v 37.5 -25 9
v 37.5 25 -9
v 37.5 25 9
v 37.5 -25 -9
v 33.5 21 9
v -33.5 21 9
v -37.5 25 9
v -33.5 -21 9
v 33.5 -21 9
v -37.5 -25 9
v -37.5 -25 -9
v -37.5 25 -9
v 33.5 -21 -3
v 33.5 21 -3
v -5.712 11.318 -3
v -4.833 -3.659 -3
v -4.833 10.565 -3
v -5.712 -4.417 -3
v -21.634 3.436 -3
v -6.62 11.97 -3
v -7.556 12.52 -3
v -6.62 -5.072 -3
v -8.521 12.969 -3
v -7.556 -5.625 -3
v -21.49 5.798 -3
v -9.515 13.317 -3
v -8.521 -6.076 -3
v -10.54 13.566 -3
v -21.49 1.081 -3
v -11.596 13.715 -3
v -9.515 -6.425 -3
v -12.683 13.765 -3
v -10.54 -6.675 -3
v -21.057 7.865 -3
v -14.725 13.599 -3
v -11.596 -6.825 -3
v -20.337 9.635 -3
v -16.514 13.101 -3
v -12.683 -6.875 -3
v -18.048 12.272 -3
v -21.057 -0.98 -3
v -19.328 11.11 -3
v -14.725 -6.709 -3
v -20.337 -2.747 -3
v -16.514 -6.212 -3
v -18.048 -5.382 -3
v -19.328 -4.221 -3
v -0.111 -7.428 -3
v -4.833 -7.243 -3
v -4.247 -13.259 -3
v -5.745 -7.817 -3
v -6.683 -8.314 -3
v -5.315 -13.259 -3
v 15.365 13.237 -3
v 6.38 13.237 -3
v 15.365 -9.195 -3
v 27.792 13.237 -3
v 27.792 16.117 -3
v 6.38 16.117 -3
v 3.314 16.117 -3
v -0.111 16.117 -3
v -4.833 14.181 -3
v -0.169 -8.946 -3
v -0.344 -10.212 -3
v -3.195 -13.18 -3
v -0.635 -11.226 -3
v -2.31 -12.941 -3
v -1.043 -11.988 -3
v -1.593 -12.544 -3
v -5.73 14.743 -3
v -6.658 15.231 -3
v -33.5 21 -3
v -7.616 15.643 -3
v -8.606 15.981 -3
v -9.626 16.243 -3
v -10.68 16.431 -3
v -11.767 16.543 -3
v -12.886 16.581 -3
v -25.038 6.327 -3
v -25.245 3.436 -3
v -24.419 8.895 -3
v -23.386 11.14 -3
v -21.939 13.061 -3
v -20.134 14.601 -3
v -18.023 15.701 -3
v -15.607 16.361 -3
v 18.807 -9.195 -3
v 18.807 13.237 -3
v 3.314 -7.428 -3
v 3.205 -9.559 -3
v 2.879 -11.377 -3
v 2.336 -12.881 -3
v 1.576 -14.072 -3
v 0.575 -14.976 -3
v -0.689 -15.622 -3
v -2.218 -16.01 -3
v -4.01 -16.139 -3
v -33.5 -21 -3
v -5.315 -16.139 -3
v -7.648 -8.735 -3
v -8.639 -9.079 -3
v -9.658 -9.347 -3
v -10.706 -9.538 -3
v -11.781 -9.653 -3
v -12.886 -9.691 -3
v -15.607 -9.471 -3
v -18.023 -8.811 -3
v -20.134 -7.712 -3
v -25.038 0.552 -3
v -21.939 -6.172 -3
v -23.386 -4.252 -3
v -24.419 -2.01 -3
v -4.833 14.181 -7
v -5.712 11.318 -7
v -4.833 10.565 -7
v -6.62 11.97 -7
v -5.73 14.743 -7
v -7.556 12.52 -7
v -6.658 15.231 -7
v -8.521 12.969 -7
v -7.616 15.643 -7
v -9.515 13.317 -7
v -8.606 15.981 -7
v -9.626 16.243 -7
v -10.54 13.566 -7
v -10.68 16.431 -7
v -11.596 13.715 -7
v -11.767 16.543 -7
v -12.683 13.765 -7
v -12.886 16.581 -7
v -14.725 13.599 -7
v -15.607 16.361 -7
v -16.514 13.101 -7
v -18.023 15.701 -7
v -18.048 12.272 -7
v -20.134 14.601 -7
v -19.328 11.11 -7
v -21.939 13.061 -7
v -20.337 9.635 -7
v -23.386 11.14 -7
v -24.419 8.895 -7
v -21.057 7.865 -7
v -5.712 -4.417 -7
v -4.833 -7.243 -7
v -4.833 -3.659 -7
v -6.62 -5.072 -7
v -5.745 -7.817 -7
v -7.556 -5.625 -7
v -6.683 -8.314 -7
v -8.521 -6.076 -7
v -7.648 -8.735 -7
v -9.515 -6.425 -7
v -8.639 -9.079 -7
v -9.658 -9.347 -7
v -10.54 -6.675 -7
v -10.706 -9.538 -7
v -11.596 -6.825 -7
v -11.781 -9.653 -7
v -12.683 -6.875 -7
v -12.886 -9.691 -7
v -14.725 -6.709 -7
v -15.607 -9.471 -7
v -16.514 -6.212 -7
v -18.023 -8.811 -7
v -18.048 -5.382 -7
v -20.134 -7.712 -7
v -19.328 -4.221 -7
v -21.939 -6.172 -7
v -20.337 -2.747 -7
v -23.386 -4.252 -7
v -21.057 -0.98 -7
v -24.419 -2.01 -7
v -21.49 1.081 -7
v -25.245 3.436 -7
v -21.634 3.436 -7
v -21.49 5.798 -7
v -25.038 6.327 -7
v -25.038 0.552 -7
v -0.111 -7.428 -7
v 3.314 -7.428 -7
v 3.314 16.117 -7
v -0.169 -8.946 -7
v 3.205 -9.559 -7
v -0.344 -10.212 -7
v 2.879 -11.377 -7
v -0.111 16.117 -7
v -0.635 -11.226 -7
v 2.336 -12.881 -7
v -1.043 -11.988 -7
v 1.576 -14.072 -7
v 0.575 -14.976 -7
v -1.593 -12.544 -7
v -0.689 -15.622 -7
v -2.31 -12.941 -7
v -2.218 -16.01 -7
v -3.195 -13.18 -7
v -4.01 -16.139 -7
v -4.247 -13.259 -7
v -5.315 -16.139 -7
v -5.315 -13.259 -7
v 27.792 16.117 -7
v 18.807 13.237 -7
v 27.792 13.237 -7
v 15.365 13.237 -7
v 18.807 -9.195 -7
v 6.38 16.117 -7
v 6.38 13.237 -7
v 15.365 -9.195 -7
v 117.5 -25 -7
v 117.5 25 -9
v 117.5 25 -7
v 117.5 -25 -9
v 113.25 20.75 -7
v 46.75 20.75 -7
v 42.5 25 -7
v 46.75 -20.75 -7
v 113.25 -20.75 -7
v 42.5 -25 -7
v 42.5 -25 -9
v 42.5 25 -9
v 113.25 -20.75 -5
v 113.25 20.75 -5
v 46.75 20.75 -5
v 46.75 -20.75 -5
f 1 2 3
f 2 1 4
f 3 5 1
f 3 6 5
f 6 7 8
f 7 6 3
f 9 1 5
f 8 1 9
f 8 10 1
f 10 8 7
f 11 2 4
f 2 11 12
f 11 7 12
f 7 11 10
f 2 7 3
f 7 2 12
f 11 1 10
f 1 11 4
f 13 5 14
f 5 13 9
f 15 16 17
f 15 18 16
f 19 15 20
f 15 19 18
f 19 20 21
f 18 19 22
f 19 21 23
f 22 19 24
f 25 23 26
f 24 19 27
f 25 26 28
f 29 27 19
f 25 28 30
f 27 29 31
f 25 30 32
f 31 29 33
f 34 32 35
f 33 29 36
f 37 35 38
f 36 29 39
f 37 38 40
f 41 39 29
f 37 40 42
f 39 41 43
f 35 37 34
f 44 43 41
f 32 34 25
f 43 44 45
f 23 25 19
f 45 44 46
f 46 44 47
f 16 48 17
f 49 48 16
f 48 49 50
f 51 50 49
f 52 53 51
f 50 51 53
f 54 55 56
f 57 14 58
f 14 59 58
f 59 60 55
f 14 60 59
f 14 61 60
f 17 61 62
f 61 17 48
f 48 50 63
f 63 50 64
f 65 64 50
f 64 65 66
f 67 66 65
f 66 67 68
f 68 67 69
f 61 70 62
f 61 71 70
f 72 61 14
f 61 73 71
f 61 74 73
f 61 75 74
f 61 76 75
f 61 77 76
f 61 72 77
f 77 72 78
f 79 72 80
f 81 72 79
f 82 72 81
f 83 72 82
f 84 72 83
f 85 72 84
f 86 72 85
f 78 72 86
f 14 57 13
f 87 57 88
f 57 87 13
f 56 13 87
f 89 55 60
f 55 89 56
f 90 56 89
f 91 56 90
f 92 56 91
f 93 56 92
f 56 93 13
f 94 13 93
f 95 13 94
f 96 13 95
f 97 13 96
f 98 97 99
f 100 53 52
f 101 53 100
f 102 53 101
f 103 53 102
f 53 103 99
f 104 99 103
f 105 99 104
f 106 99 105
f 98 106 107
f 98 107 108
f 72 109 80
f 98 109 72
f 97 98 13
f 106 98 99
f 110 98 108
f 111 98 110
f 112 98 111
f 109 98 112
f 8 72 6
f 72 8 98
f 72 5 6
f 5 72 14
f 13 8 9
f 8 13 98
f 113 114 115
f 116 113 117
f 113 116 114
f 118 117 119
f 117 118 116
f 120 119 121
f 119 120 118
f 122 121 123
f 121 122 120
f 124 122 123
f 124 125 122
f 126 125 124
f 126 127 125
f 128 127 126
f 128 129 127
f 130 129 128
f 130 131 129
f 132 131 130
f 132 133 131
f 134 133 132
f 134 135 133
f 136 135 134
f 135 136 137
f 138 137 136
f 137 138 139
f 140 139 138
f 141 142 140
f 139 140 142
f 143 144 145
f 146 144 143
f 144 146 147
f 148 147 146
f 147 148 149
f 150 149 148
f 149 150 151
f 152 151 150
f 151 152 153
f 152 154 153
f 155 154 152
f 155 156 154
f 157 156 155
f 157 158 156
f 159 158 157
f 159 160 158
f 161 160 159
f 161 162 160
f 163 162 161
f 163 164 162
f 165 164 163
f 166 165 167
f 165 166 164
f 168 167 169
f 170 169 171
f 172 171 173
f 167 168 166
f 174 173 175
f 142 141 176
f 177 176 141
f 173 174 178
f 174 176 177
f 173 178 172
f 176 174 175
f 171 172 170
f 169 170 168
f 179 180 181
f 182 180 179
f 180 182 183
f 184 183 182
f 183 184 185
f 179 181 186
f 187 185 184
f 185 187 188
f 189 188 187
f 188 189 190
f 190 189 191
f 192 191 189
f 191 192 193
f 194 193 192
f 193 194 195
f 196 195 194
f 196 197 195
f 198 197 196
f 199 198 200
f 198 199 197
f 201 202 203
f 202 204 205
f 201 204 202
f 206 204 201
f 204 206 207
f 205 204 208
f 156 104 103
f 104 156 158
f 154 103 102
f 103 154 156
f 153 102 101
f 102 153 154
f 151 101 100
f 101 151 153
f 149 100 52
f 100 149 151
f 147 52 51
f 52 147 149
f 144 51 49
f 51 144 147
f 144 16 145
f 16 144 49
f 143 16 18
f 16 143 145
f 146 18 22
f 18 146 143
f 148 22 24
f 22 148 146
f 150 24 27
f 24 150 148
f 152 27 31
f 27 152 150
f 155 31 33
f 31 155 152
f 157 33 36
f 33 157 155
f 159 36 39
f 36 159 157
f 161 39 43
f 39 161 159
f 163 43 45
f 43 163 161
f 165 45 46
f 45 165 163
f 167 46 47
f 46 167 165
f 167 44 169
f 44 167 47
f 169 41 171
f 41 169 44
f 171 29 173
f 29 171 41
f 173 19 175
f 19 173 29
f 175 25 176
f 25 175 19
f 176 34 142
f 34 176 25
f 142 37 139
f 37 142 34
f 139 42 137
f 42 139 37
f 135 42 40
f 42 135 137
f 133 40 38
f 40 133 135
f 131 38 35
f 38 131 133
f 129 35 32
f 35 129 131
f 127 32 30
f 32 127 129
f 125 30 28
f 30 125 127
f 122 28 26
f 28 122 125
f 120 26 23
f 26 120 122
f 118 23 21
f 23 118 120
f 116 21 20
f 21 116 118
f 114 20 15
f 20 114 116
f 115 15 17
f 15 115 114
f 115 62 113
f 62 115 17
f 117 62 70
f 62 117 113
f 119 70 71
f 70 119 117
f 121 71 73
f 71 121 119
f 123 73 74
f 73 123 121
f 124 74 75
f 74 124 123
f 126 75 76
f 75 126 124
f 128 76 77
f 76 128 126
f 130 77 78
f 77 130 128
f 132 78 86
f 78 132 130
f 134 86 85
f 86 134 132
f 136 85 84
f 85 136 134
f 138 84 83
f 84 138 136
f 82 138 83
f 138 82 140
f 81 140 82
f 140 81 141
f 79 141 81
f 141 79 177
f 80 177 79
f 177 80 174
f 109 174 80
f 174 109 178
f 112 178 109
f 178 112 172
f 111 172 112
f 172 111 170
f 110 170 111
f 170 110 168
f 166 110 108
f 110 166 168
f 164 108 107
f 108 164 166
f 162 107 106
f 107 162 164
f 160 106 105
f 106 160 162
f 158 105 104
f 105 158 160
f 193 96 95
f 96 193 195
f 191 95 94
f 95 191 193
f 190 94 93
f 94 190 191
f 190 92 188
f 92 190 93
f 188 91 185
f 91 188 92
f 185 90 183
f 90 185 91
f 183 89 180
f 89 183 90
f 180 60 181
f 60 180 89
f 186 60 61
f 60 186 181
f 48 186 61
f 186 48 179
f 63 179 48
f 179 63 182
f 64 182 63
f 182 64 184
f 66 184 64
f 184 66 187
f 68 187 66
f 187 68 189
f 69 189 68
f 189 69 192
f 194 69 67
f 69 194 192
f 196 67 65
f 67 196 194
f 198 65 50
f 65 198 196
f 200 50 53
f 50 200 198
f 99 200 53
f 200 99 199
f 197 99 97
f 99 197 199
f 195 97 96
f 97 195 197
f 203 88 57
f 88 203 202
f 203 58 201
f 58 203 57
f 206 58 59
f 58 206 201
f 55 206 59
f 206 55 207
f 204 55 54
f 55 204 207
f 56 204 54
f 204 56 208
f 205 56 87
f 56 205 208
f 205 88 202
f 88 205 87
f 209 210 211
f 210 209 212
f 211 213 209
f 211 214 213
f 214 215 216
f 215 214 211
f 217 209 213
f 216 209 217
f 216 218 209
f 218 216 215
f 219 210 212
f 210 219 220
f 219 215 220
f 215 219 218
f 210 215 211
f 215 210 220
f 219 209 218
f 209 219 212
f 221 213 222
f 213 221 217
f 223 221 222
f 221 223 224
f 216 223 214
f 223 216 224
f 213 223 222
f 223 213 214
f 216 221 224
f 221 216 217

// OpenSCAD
//Cutomizable Jewlery Box with Lid

//Width
X=50;
//Length-Must by 1.5 Times Larger Than Width if adding Initials
Y=75;
//Height
Z=18;
//Wall Thickness
T=4;
//Lid Thickness
L=2;
//Initials (Max 3 Characters)
A="CJT";
module LetterBlock(letter, size=X/2) {

           linear_extrude(height=size, convexity=4)
               text(letter, 
                    size,
                    font="Bitstream Vera Sans",
                    halign="center",
                    valign="center");
                               }

//equations
module Box(){
difference(){
    cube([Y,X,Z],center=true);
    translate([0,0,T])
cube([Y-2*T,X-2*T,Z-T],center=true);}}
difference(){
Box();
translate([0,0,-(Z/2)+(T/2)])
LetterBlock(A);}


  union(){
translate([Y+5,0,-(Z/2)+(L/2)])
cube([Y,X,L],center=true);
translate([Y+5,0,-(Z/2)+(L/2)+L])
cube([Y-2*T-.5,X-2*T-.5,L],center=true);}
